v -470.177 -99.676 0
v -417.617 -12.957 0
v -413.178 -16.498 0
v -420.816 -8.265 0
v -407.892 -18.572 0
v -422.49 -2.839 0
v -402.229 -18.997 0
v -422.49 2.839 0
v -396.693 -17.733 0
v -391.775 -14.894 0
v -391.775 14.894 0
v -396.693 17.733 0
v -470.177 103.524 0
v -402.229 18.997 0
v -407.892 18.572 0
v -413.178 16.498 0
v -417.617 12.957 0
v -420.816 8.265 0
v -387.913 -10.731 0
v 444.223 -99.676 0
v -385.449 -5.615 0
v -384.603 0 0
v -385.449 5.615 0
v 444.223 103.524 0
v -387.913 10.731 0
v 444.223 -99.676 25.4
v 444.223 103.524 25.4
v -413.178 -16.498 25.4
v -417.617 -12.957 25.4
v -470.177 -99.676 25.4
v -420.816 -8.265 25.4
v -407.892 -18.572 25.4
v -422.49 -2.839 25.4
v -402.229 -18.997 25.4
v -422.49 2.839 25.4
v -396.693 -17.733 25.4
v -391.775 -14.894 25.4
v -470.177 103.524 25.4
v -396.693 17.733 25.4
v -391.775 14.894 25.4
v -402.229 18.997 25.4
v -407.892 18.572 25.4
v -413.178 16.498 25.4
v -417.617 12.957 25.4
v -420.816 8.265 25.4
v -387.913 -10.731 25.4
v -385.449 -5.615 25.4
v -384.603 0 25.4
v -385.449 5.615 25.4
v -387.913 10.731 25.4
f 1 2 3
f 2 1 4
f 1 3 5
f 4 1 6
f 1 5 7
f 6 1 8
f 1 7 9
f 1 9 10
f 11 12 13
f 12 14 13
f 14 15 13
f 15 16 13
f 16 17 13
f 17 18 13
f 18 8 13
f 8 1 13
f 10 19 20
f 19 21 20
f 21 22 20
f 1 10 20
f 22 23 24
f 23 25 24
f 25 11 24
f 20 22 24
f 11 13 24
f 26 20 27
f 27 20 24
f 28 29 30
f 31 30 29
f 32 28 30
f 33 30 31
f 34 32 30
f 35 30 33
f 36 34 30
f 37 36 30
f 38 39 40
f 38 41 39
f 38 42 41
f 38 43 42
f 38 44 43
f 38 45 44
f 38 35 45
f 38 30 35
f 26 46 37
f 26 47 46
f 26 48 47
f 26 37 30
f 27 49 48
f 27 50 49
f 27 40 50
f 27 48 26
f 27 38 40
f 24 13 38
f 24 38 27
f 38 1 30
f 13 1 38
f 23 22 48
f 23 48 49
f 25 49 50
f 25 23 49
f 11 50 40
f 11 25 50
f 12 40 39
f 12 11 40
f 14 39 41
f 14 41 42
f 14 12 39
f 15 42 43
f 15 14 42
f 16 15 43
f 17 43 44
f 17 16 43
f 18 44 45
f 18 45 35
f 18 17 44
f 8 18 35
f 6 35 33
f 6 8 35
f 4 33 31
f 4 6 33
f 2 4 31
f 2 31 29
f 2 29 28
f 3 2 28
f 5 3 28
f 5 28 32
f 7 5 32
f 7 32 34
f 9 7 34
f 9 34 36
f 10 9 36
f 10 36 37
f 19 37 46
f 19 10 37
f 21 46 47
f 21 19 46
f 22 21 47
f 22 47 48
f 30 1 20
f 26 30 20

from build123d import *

# Parameters (mm, degrees)
F0_W     = 914.4
F0_H     = 203.2
F0_R     = 19.05
F1_DEPTH = 25.4


with BuildPart() as f1:
    # F0 (on Top) → F1 (new body)
    with BuildSketch(Plane.XY):
        with Locations((-12.977471, 1.923766)):
            Rectangle(F0_W, F0_H)
        with Locations((-403.652728, 0)):
            Circle(F0_R, mode=Mode.SUBTRACT)
    extrude(amount=F1_DEPTH)


solid = f1.part
